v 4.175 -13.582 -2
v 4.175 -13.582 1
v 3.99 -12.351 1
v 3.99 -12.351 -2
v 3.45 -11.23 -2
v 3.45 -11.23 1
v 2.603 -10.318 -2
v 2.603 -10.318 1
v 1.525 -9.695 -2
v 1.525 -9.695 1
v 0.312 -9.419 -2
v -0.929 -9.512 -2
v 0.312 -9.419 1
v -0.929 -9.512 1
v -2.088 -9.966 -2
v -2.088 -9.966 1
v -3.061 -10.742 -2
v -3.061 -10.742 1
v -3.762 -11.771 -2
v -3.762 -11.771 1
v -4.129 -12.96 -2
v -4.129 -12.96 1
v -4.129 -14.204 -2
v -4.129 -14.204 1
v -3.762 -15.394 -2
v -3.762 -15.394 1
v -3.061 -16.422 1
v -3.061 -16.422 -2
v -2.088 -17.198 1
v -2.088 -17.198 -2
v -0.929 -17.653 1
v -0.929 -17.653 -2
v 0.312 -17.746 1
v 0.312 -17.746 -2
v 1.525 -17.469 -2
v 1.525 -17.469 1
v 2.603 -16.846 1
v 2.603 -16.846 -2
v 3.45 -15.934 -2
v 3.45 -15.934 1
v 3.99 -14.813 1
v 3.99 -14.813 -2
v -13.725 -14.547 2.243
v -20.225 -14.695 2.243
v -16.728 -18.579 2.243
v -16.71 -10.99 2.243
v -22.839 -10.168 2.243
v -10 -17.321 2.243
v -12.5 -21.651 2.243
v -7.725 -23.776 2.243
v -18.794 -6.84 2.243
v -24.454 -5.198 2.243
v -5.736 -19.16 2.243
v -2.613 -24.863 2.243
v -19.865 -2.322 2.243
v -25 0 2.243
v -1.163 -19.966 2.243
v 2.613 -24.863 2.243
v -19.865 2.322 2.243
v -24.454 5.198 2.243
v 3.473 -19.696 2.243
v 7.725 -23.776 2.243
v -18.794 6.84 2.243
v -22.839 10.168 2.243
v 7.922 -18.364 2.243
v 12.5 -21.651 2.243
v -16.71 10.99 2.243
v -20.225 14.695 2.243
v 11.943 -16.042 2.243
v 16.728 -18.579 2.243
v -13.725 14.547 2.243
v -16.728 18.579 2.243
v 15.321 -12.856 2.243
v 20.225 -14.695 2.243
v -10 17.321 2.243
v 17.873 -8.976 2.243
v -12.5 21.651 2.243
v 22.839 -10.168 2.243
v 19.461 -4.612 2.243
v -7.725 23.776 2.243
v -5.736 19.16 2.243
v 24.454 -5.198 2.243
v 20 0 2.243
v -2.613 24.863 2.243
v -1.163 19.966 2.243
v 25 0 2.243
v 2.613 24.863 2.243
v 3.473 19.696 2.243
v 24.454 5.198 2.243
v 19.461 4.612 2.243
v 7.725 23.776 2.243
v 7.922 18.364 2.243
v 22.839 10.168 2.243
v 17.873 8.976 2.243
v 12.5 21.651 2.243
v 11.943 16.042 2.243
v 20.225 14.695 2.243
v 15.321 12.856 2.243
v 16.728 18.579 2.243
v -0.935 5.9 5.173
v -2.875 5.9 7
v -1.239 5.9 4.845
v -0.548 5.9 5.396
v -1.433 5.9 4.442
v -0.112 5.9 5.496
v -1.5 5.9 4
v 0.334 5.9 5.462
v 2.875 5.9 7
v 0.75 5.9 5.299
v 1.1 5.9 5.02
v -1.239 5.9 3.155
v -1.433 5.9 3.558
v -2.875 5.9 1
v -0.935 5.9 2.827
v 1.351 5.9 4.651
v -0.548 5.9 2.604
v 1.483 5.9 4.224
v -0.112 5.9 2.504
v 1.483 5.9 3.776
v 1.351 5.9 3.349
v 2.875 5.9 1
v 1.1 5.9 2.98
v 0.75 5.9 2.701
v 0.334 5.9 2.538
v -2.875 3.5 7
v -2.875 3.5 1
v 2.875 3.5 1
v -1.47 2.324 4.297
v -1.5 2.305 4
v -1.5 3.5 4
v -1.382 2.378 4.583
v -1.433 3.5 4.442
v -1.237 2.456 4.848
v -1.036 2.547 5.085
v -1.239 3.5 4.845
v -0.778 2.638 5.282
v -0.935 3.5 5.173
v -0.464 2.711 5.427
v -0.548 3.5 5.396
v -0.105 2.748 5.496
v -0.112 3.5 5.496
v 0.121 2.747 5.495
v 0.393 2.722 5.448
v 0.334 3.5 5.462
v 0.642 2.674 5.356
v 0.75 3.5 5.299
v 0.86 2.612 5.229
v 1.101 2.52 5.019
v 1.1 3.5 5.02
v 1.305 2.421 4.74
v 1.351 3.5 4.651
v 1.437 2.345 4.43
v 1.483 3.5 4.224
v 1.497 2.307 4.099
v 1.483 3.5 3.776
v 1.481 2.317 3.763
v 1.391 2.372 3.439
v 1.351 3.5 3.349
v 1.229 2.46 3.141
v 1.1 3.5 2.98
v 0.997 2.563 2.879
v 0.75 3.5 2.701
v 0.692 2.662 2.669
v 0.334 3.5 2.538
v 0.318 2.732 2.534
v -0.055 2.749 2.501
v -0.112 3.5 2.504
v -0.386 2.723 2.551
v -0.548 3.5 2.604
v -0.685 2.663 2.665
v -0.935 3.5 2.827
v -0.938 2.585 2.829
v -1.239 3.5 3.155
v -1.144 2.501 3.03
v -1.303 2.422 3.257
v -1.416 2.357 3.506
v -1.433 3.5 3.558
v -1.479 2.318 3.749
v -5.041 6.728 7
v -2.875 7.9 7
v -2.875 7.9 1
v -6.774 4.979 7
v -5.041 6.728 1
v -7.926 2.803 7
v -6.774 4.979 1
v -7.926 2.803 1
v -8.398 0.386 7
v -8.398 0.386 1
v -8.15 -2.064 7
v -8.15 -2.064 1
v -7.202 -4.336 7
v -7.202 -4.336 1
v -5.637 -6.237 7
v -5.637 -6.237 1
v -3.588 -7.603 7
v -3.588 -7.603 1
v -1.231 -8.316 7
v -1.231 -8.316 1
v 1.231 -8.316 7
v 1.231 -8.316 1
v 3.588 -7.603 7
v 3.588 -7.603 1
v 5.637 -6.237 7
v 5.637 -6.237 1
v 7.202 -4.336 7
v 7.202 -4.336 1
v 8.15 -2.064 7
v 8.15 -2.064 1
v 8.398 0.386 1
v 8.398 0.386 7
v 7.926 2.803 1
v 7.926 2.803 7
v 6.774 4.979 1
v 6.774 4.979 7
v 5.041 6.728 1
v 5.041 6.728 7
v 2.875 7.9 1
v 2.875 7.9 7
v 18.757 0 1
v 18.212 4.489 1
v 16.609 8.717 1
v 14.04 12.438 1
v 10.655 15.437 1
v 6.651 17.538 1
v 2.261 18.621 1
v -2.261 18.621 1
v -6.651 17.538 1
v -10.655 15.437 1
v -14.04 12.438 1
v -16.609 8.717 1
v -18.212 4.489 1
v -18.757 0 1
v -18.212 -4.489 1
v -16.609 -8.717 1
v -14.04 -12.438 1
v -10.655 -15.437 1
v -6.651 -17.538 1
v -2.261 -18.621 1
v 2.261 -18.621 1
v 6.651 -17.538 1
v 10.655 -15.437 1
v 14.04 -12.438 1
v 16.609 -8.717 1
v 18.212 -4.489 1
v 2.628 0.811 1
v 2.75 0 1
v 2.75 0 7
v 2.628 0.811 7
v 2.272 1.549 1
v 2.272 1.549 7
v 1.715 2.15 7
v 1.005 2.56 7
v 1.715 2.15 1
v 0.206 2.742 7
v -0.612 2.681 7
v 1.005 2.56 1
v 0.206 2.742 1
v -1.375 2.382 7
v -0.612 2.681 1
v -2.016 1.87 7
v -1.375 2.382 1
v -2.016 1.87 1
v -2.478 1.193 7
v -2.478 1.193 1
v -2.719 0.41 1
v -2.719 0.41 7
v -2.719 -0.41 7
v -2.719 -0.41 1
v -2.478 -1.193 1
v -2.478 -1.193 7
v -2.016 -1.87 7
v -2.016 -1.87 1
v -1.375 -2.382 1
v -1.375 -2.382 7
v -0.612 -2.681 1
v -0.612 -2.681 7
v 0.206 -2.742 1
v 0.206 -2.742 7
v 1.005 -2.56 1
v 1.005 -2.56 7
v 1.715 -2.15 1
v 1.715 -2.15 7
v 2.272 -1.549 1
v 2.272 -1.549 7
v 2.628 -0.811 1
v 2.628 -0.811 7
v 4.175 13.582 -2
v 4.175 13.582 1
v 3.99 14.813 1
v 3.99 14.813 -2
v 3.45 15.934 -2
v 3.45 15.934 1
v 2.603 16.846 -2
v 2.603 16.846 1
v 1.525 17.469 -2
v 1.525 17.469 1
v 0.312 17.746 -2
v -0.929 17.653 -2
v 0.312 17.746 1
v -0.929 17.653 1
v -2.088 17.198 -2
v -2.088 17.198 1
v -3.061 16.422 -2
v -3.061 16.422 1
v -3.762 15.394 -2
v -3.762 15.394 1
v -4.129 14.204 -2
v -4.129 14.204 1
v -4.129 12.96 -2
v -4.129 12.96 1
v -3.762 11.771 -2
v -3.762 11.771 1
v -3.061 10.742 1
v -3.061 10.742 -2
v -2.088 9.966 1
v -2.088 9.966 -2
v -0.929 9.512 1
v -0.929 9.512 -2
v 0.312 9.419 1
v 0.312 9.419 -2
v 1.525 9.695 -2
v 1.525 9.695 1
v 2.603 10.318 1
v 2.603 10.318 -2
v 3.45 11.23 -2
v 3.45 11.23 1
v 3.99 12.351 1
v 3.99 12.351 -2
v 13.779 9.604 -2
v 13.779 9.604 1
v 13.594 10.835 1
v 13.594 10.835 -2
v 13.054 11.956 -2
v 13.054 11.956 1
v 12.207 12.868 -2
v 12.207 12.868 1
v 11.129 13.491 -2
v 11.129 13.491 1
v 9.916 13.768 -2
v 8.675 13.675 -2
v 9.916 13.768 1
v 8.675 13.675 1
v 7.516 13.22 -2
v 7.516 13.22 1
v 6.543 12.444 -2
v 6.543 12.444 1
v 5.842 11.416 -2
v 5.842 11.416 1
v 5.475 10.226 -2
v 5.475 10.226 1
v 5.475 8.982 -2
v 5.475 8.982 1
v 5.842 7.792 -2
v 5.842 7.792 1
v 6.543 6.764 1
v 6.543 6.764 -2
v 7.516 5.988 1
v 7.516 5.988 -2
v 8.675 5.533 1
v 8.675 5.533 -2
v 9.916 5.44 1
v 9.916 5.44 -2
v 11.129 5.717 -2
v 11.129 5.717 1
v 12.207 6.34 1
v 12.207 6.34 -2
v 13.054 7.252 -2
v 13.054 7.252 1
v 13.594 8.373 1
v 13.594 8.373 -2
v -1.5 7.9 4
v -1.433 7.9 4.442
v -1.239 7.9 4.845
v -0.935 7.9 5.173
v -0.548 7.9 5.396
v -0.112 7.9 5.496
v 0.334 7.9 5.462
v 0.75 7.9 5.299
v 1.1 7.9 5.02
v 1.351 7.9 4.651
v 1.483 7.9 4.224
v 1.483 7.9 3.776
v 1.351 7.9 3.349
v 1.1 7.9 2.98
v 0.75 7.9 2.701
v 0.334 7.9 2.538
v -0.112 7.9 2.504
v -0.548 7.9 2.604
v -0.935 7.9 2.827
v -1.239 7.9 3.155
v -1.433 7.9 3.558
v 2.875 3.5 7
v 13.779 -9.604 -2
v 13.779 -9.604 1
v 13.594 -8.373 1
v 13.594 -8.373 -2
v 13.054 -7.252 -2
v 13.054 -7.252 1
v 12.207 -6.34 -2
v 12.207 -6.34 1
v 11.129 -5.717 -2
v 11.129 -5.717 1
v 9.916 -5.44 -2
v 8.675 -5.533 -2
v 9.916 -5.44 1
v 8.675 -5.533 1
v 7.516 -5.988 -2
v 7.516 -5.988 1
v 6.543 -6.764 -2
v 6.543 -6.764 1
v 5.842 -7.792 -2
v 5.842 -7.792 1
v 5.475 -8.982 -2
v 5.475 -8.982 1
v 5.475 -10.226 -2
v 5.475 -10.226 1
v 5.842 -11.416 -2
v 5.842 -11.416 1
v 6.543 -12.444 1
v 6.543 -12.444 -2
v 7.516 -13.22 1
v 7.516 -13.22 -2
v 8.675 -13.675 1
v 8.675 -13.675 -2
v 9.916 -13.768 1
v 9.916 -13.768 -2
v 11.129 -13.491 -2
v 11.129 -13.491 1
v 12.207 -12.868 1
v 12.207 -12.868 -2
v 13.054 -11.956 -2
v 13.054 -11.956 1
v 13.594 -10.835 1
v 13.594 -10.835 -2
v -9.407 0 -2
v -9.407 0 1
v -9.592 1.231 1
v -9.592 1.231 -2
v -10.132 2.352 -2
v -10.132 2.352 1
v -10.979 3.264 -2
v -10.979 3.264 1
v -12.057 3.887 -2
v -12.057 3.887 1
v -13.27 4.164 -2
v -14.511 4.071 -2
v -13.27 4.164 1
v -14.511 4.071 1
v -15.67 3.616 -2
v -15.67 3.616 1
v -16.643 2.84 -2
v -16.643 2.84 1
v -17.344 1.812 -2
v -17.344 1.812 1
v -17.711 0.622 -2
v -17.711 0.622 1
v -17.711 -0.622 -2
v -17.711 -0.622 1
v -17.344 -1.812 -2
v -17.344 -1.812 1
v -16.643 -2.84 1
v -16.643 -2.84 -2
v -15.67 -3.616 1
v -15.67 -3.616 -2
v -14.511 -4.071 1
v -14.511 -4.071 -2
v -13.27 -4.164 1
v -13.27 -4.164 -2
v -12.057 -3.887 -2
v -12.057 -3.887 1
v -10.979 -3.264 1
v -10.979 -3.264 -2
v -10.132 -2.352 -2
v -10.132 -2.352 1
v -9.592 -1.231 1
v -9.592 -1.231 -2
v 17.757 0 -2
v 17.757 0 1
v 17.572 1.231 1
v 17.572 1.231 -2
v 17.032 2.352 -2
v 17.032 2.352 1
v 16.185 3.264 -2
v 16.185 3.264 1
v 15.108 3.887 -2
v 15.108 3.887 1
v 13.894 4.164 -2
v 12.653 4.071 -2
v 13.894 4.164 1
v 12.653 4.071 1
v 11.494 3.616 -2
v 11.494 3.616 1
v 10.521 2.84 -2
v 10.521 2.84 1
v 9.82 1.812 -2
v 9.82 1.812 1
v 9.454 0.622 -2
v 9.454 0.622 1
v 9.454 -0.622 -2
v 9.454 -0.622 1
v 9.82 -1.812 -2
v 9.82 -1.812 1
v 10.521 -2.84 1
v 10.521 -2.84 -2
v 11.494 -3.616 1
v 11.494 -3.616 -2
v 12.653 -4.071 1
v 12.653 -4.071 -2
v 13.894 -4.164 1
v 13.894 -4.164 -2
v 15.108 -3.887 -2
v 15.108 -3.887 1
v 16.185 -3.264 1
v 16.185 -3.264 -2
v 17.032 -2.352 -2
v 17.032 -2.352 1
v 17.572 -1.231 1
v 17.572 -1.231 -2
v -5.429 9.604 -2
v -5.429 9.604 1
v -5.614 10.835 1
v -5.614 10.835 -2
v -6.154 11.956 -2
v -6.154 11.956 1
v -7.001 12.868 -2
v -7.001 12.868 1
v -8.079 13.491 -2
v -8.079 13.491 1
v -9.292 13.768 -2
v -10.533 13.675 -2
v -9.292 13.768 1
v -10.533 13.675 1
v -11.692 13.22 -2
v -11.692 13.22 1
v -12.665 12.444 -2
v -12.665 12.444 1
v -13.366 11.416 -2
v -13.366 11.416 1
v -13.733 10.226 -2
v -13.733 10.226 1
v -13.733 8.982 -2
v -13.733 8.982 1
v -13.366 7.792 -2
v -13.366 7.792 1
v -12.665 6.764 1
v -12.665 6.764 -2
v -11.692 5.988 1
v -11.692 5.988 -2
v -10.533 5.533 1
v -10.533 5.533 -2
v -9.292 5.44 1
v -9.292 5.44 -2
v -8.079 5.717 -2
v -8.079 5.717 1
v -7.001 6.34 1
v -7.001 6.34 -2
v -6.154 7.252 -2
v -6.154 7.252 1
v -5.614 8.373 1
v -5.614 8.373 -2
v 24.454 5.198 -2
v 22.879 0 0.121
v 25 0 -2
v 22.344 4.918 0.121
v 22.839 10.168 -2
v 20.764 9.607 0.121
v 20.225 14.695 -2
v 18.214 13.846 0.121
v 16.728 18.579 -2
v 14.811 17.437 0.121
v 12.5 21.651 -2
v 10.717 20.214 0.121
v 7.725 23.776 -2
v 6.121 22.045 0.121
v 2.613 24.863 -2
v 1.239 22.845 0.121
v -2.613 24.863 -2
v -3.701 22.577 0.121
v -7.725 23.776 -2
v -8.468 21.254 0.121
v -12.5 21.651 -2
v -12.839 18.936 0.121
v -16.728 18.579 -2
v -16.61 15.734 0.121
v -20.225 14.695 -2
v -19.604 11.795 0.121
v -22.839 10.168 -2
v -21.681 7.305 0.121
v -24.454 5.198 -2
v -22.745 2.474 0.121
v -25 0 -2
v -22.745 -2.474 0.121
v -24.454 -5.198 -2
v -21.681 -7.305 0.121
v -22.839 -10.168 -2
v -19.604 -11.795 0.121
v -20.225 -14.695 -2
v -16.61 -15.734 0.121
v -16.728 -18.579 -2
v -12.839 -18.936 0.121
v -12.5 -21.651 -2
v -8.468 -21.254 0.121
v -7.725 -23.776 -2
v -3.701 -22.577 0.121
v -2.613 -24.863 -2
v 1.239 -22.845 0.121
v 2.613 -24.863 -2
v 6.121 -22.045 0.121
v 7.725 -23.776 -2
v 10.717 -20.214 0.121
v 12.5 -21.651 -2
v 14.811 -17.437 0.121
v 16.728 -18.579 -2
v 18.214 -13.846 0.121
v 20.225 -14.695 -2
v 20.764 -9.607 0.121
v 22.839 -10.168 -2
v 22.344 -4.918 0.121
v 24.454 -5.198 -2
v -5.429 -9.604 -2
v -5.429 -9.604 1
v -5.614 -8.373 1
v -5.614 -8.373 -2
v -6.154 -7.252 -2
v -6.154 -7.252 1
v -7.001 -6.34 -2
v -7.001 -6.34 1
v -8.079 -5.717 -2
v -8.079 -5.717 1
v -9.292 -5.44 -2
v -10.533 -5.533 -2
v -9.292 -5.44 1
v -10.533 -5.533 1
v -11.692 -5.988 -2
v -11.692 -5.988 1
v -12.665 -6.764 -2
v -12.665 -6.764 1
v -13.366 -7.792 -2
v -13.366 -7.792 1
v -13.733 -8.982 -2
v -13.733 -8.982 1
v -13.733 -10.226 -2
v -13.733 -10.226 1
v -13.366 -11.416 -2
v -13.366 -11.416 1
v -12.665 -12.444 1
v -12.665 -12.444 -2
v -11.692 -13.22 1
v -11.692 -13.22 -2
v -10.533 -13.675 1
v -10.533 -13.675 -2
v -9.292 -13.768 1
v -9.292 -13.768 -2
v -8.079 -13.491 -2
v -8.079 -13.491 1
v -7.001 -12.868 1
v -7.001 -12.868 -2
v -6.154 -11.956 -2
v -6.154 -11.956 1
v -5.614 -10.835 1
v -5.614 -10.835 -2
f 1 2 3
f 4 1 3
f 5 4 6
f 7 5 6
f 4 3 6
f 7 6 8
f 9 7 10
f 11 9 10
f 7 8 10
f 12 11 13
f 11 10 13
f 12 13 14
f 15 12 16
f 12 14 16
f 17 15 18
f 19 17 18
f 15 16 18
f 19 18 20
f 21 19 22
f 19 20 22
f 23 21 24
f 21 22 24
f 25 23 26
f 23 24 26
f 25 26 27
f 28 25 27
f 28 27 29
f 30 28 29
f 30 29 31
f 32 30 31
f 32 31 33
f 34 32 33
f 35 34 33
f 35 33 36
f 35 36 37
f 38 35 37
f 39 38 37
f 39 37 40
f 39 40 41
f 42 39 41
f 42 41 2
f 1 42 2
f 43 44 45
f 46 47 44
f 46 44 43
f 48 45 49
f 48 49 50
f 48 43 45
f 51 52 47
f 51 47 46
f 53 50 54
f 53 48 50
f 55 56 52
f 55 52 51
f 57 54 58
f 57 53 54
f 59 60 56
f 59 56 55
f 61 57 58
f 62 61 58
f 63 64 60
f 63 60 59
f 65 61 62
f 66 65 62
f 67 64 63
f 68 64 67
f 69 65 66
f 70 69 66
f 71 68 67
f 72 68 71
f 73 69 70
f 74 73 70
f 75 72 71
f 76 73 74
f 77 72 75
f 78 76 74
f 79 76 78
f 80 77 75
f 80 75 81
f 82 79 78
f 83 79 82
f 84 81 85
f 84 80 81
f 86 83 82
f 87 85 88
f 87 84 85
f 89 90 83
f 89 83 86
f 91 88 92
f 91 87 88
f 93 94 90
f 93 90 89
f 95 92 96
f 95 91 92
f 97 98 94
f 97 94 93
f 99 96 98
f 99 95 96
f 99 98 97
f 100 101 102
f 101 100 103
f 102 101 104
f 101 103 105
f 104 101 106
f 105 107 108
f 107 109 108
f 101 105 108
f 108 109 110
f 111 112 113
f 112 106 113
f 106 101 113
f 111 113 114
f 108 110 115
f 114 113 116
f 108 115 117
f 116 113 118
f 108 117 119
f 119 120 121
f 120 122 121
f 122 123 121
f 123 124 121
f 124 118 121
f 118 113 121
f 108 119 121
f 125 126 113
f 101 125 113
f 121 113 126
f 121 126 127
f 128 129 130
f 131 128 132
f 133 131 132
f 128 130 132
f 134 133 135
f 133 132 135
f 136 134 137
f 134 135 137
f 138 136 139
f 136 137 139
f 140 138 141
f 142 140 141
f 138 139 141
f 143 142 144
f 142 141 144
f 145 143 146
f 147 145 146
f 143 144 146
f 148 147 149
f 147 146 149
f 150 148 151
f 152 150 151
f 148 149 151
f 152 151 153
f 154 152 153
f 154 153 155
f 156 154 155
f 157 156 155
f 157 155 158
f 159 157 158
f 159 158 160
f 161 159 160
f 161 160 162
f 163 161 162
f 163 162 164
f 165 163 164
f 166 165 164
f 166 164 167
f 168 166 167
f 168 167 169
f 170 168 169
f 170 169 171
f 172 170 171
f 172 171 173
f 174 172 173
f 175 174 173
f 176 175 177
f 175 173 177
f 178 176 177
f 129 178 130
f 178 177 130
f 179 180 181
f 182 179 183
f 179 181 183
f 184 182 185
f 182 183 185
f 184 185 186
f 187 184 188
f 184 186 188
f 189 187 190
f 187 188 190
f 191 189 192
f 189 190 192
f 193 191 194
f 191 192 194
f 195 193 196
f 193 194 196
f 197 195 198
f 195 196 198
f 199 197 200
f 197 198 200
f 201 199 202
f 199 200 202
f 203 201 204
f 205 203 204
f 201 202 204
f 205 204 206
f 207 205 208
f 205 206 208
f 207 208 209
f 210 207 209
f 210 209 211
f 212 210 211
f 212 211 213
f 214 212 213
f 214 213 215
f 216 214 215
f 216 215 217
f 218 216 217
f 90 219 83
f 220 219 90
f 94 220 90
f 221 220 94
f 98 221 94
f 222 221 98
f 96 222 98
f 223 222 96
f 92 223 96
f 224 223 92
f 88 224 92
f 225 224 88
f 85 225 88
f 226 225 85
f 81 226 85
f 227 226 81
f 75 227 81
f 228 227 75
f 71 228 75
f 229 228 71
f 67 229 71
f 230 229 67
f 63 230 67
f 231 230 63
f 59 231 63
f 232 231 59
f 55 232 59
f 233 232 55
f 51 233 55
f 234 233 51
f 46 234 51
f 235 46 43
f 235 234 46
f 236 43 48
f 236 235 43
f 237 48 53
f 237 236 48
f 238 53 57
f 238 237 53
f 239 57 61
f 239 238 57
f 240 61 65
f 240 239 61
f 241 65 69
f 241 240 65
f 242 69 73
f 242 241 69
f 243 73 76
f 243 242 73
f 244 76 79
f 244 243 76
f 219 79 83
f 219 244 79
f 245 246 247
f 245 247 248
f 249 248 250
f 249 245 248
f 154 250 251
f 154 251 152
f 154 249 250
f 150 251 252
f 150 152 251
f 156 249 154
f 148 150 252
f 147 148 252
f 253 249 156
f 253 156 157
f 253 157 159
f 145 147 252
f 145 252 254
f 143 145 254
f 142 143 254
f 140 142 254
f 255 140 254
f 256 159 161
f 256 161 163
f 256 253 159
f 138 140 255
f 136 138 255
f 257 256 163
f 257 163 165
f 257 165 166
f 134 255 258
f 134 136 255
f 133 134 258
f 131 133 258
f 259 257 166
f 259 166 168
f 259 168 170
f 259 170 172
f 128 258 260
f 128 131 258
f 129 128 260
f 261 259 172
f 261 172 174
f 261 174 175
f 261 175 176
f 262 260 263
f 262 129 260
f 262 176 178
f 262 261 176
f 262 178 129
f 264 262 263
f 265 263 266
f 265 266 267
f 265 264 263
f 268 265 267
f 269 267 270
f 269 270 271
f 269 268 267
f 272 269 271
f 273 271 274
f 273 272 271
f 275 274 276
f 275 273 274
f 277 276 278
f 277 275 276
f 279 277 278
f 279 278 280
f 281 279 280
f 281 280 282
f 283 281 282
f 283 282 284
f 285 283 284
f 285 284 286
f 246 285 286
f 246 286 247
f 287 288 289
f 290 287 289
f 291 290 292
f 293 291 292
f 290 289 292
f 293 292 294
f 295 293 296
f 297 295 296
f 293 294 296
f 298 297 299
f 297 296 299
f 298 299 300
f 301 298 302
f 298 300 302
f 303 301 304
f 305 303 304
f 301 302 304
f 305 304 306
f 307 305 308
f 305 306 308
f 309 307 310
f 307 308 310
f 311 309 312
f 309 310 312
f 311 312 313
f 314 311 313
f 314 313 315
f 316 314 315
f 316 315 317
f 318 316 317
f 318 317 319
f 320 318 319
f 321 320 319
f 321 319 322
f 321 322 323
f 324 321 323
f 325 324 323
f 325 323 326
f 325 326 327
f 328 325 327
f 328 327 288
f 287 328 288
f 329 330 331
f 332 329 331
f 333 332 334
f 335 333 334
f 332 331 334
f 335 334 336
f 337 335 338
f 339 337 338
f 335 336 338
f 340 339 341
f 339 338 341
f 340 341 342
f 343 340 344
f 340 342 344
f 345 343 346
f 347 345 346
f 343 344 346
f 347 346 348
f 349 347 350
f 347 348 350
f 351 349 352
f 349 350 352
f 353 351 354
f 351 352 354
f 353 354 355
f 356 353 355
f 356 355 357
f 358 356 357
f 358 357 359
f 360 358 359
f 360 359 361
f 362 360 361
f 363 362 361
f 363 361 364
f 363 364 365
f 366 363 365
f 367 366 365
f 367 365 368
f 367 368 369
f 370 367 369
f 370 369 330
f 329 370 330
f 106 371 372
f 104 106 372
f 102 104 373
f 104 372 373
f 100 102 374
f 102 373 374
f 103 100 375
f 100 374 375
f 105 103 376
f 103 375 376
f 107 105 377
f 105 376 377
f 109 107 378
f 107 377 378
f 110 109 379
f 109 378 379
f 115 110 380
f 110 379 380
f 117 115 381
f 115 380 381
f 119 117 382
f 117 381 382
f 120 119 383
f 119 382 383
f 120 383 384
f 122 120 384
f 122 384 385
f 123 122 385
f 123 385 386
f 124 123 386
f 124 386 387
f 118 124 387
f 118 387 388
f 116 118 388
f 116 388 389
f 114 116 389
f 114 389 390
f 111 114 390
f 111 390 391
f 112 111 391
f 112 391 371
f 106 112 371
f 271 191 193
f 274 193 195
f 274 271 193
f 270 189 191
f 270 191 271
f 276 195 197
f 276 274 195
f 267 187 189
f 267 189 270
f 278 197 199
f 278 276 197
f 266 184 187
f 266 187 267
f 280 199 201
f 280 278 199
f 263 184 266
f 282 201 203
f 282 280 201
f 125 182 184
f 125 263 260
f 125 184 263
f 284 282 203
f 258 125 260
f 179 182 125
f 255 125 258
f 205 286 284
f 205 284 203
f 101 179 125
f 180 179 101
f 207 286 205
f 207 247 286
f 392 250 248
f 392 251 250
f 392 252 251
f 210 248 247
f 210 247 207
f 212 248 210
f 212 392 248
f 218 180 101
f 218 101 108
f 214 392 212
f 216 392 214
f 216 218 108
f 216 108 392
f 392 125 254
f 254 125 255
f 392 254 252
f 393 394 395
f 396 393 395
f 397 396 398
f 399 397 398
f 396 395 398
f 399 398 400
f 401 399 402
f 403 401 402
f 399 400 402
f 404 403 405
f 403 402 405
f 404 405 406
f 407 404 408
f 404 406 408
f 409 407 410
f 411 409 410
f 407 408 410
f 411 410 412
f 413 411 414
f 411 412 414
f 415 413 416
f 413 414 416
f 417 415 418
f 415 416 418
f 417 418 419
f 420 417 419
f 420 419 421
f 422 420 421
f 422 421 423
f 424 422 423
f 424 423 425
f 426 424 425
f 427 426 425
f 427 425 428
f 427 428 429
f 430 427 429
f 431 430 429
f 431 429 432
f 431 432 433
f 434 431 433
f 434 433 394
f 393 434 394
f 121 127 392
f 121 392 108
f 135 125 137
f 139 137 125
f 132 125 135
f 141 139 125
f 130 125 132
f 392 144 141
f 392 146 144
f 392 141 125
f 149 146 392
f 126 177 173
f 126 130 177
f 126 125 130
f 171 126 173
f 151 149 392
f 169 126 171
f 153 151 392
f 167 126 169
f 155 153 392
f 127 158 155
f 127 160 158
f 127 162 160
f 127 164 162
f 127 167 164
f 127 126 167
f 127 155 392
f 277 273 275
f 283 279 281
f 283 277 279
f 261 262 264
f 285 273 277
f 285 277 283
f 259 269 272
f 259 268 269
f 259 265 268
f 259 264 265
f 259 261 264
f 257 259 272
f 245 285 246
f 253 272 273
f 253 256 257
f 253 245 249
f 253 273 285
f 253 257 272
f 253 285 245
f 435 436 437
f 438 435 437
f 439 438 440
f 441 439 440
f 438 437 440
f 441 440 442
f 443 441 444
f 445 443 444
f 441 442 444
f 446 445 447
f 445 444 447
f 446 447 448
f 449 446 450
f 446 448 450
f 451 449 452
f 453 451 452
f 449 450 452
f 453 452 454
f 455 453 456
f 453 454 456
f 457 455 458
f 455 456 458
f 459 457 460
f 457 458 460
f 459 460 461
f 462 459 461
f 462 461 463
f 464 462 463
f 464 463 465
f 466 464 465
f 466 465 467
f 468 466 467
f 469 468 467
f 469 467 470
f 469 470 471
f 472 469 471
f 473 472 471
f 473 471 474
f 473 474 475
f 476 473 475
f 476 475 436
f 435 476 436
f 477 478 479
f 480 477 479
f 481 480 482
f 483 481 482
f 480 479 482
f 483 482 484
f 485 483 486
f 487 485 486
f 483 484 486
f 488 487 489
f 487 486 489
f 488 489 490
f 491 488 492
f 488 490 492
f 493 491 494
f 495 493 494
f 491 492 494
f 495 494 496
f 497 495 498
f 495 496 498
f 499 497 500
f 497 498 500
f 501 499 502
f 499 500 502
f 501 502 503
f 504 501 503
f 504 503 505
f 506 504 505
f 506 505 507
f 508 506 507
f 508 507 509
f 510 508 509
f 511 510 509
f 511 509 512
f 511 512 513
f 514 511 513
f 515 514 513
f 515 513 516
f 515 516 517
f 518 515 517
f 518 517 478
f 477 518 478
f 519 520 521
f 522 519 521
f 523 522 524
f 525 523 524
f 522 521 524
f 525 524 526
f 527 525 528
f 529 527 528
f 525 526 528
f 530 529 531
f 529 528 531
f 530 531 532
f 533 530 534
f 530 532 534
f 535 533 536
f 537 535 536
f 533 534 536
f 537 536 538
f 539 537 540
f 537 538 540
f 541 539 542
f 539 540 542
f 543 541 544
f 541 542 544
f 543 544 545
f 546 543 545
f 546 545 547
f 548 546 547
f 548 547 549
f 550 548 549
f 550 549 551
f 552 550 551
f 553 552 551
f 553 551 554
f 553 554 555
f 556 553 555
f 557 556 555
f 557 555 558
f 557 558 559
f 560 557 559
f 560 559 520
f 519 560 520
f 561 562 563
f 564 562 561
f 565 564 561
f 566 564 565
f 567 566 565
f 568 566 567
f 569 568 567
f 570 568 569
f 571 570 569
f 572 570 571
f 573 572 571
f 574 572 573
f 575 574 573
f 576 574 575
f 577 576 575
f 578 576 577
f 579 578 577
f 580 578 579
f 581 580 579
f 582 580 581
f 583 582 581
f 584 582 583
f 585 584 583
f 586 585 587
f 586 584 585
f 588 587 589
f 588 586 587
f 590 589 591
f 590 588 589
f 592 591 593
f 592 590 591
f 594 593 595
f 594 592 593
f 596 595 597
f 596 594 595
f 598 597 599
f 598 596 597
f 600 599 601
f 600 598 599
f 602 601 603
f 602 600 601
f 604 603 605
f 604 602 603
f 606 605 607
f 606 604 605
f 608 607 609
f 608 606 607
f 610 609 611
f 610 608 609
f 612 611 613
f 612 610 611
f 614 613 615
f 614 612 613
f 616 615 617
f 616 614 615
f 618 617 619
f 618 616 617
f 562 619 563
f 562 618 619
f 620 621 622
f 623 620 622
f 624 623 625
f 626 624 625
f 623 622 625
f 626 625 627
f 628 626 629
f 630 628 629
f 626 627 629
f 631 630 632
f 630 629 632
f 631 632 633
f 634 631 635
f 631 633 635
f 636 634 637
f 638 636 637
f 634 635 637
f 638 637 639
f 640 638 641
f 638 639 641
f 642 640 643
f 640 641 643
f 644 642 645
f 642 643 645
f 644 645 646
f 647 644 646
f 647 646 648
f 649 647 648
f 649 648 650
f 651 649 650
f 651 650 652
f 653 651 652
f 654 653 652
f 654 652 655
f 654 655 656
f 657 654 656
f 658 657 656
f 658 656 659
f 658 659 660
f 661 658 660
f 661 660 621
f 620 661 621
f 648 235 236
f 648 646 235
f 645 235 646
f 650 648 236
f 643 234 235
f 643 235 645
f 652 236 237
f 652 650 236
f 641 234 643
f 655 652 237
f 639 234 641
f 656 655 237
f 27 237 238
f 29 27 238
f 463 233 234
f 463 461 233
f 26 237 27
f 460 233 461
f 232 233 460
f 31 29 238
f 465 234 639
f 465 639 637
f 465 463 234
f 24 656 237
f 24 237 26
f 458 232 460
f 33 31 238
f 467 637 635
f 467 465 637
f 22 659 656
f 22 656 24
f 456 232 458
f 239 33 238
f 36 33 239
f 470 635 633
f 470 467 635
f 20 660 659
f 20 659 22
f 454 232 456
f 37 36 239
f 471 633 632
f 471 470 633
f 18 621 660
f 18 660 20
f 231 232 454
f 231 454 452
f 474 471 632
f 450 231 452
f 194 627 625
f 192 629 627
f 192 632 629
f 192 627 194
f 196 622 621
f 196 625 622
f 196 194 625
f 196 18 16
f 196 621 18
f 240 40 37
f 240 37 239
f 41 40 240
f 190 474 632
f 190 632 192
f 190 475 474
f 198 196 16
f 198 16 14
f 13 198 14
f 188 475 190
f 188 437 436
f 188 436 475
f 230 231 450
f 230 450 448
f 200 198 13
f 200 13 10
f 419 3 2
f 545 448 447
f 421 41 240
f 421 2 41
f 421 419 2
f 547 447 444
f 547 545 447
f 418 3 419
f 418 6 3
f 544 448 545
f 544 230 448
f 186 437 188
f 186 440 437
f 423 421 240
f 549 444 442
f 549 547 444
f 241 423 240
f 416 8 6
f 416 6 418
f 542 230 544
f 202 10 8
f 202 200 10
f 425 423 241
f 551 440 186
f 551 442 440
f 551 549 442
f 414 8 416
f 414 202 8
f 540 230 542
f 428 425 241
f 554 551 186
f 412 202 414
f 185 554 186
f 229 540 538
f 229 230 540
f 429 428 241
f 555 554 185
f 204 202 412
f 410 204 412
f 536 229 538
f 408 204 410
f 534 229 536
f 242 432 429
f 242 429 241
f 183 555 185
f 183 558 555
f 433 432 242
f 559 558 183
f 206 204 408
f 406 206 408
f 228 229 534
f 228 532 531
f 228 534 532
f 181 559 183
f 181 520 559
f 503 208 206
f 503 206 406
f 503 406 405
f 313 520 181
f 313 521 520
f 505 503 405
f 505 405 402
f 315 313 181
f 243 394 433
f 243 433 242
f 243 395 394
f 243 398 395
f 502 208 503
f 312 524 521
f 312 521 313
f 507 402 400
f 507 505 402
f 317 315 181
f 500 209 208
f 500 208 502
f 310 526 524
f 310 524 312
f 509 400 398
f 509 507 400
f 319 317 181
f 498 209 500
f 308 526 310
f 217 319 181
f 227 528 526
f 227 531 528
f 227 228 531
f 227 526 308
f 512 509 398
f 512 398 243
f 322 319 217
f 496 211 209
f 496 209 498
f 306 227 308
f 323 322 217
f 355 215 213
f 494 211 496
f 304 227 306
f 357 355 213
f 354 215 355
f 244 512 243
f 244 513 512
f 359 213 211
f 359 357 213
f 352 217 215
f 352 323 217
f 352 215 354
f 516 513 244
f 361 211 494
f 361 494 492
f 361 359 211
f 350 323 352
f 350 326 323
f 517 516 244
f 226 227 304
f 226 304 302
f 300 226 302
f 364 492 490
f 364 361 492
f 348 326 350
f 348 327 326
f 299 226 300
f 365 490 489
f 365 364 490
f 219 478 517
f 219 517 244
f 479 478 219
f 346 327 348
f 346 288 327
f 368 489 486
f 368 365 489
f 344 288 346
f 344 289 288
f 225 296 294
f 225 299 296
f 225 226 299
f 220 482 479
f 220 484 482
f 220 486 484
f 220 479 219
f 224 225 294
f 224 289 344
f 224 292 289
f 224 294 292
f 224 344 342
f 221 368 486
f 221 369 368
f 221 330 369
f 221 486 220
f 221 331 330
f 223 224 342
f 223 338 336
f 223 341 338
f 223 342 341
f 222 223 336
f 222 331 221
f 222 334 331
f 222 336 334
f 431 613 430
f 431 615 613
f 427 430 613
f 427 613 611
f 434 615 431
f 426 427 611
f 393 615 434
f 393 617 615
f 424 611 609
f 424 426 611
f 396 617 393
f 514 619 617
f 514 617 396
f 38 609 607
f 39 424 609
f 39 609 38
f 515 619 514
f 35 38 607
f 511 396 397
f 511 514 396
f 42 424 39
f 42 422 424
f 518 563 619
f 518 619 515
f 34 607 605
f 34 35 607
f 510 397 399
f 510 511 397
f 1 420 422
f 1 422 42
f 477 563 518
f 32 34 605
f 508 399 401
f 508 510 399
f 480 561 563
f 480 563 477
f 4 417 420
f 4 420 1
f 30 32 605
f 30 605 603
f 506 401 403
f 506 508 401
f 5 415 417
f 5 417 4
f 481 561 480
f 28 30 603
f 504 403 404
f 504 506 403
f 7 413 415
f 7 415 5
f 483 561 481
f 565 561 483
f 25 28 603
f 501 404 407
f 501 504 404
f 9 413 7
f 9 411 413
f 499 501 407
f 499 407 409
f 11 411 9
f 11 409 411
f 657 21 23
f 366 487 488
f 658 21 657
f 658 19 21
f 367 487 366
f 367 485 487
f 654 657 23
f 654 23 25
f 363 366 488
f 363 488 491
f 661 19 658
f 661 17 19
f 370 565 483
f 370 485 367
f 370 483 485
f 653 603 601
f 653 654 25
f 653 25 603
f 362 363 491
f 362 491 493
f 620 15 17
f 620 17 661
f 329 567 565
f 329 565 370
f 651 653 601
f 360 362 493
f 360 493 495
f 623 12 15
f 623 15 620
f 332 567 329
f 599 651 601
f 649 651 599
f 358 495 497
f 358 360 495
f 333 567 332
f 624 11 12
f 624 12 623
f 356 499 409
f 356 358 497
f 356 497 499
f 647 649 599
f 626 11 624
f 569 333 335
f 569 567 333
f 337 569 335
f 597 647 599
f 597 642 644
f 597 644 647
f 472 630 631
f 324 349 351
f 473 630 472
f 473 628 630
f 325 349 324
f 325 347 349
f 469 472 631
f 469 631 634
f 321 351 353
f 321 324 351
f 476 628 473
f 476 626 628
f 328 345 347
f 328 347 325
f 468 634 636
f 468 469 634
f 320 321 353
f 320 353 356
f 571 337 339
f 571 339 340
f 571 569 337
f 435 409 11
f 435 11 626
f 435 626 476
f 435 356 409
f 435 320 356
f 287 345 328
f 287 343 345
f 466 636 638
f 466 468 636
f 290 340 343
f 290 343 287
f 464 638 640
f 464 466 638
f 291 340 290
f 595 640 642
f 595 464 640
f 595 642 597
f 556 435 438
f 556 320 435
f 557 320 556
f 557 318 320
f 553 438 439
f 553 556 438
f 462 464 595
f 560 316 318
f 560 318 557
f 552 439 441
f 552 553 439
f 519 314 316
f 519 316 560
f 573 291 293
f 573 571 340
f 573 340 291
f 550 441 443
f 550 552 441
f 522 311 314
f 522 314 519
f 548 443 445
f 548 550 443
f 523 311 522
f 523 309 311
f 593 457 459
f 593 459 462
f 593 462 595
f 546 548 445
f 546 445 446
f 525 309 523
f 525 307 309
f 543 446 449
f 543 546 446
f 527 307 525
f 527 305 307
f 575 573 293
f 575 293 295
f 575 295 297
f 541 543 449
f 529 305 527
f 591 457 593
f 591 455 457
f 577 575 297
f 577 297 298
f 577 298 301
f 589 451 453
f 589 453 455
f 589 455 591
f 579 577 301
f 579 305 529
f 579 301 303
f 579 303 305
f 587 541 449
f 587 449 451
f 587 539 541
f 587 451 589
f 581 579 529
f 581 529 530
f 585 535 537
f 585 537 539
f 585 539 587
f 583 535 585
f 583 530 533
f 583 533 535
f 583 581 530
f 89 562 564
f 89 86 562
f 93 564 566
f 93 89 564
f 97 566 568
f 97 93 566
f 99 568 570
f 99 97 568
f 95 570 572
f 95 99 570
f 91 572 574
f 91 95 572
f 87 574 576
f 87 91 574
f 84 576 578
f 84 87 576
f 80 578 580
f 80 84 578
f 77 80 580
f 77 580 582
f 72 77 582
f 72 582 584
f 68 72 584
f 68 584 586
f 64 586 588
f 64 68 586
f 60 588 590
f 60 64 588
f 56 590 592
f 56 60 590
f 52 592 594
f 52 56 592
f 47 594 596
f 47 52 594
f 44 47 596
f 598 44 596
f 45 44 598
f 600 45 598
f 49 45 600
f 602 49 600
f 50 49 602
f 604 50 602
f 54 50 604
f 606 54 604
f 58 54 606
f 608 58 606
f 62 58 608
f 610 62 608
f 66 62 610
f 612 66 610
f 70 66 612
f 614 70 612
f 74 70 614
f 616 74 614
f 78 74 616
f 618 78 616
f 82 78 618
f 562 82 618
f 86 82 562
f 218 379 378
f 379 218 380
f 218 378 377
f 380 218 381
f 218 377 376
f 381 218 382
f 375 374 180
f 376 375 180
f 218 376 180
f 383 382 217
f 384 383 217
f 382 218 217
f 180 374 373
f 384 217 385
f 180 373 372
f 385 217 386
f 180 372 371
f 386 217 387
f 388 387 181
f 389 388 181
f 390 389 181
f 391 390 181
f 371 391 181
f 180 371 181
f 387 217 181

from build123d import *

# Parameters (mm, degrees)
F0_R     = 2.75
F0_W     = 5.75
F0_H     = 2.4
F1_DEPTH = 7
F4_R     = 4.1752398448
F5_DEPTH = 3.001
F6_R     = 1.5
F7_DEPTH = 6.595113986


with BuildPart() as f1:
    # F0 (on Top) → F1 (new body)
    with BuildSketch(Plane.XY):
        with BuildLine():
            Line((2.875, 7.9), (-2.875, 7.9))
            ThreePointArc((-2.875, 7.9), (0, -8.4068796233), (2.875, 7.9))
        make_face()
        Circle(F0_R, mode=Mode.SUBTRACT)
        with Locations((0, 4.7)):
            Rectangle(F0_W, F0_H, mode=Mode.SUBTRACT)
    extrude(amount=F1_DEPTH)

    # F2 (on Front) → F3 (revolve)
    with BuildSketch(Plane.XZ):
        Polygon((0, 1), (0, 0), (0, -2), (25, -2), (22.8786796564, 0.1213203436), (25, 2.2426406871), (20, 2.2426406871), (18.7573593129, 1), align=None)
    revolve(axis=Axis((0, 0, -1), (0, 0, 1)))

    # F4 (on face) → F5 (cut, through all)
    with BuildSketch(Plane.XY.offset(1)):
        with Locations((13.5821194681, 0)):
            Circle(F4_R)
        with Locations((9.6040087788, -9.6040087788)):
            Circle(F4_R)
        with Locations((0, -13.5821194681)):
            Circle(F4_R)
        with Locations((-9.6040087788, -9.6040087788)):
            Circle(F4_R)
        with Locations((-13.5821194681, 0)):
            Circle(F4_R)
        with Locations((-9.6040087788, 9.6040087788)):
            Circle(F4_R)
        with Locations((0, 13.5821194681)):
            Circle(F4_R)
        with Locations((9.6040087788, 9.6040087788)):
            Circle(F4_R)
    extrude(amount=-F5_DEPTH, mode=Mode.SUBTRACT)

    # F6 (on face) → F7 (cut, up to face)
    with BuildSketch(Plane(origin=(0, 7.9, 0), x_dir=(-1, 0, 0), z_dir=(0, 1, 0))):
        with Locations((0, 4)):
            Circle(F6_R)
    extrude(amount=-F7_DEPTH, mode=Mode.SUBTRACT)


solid = f1.part
